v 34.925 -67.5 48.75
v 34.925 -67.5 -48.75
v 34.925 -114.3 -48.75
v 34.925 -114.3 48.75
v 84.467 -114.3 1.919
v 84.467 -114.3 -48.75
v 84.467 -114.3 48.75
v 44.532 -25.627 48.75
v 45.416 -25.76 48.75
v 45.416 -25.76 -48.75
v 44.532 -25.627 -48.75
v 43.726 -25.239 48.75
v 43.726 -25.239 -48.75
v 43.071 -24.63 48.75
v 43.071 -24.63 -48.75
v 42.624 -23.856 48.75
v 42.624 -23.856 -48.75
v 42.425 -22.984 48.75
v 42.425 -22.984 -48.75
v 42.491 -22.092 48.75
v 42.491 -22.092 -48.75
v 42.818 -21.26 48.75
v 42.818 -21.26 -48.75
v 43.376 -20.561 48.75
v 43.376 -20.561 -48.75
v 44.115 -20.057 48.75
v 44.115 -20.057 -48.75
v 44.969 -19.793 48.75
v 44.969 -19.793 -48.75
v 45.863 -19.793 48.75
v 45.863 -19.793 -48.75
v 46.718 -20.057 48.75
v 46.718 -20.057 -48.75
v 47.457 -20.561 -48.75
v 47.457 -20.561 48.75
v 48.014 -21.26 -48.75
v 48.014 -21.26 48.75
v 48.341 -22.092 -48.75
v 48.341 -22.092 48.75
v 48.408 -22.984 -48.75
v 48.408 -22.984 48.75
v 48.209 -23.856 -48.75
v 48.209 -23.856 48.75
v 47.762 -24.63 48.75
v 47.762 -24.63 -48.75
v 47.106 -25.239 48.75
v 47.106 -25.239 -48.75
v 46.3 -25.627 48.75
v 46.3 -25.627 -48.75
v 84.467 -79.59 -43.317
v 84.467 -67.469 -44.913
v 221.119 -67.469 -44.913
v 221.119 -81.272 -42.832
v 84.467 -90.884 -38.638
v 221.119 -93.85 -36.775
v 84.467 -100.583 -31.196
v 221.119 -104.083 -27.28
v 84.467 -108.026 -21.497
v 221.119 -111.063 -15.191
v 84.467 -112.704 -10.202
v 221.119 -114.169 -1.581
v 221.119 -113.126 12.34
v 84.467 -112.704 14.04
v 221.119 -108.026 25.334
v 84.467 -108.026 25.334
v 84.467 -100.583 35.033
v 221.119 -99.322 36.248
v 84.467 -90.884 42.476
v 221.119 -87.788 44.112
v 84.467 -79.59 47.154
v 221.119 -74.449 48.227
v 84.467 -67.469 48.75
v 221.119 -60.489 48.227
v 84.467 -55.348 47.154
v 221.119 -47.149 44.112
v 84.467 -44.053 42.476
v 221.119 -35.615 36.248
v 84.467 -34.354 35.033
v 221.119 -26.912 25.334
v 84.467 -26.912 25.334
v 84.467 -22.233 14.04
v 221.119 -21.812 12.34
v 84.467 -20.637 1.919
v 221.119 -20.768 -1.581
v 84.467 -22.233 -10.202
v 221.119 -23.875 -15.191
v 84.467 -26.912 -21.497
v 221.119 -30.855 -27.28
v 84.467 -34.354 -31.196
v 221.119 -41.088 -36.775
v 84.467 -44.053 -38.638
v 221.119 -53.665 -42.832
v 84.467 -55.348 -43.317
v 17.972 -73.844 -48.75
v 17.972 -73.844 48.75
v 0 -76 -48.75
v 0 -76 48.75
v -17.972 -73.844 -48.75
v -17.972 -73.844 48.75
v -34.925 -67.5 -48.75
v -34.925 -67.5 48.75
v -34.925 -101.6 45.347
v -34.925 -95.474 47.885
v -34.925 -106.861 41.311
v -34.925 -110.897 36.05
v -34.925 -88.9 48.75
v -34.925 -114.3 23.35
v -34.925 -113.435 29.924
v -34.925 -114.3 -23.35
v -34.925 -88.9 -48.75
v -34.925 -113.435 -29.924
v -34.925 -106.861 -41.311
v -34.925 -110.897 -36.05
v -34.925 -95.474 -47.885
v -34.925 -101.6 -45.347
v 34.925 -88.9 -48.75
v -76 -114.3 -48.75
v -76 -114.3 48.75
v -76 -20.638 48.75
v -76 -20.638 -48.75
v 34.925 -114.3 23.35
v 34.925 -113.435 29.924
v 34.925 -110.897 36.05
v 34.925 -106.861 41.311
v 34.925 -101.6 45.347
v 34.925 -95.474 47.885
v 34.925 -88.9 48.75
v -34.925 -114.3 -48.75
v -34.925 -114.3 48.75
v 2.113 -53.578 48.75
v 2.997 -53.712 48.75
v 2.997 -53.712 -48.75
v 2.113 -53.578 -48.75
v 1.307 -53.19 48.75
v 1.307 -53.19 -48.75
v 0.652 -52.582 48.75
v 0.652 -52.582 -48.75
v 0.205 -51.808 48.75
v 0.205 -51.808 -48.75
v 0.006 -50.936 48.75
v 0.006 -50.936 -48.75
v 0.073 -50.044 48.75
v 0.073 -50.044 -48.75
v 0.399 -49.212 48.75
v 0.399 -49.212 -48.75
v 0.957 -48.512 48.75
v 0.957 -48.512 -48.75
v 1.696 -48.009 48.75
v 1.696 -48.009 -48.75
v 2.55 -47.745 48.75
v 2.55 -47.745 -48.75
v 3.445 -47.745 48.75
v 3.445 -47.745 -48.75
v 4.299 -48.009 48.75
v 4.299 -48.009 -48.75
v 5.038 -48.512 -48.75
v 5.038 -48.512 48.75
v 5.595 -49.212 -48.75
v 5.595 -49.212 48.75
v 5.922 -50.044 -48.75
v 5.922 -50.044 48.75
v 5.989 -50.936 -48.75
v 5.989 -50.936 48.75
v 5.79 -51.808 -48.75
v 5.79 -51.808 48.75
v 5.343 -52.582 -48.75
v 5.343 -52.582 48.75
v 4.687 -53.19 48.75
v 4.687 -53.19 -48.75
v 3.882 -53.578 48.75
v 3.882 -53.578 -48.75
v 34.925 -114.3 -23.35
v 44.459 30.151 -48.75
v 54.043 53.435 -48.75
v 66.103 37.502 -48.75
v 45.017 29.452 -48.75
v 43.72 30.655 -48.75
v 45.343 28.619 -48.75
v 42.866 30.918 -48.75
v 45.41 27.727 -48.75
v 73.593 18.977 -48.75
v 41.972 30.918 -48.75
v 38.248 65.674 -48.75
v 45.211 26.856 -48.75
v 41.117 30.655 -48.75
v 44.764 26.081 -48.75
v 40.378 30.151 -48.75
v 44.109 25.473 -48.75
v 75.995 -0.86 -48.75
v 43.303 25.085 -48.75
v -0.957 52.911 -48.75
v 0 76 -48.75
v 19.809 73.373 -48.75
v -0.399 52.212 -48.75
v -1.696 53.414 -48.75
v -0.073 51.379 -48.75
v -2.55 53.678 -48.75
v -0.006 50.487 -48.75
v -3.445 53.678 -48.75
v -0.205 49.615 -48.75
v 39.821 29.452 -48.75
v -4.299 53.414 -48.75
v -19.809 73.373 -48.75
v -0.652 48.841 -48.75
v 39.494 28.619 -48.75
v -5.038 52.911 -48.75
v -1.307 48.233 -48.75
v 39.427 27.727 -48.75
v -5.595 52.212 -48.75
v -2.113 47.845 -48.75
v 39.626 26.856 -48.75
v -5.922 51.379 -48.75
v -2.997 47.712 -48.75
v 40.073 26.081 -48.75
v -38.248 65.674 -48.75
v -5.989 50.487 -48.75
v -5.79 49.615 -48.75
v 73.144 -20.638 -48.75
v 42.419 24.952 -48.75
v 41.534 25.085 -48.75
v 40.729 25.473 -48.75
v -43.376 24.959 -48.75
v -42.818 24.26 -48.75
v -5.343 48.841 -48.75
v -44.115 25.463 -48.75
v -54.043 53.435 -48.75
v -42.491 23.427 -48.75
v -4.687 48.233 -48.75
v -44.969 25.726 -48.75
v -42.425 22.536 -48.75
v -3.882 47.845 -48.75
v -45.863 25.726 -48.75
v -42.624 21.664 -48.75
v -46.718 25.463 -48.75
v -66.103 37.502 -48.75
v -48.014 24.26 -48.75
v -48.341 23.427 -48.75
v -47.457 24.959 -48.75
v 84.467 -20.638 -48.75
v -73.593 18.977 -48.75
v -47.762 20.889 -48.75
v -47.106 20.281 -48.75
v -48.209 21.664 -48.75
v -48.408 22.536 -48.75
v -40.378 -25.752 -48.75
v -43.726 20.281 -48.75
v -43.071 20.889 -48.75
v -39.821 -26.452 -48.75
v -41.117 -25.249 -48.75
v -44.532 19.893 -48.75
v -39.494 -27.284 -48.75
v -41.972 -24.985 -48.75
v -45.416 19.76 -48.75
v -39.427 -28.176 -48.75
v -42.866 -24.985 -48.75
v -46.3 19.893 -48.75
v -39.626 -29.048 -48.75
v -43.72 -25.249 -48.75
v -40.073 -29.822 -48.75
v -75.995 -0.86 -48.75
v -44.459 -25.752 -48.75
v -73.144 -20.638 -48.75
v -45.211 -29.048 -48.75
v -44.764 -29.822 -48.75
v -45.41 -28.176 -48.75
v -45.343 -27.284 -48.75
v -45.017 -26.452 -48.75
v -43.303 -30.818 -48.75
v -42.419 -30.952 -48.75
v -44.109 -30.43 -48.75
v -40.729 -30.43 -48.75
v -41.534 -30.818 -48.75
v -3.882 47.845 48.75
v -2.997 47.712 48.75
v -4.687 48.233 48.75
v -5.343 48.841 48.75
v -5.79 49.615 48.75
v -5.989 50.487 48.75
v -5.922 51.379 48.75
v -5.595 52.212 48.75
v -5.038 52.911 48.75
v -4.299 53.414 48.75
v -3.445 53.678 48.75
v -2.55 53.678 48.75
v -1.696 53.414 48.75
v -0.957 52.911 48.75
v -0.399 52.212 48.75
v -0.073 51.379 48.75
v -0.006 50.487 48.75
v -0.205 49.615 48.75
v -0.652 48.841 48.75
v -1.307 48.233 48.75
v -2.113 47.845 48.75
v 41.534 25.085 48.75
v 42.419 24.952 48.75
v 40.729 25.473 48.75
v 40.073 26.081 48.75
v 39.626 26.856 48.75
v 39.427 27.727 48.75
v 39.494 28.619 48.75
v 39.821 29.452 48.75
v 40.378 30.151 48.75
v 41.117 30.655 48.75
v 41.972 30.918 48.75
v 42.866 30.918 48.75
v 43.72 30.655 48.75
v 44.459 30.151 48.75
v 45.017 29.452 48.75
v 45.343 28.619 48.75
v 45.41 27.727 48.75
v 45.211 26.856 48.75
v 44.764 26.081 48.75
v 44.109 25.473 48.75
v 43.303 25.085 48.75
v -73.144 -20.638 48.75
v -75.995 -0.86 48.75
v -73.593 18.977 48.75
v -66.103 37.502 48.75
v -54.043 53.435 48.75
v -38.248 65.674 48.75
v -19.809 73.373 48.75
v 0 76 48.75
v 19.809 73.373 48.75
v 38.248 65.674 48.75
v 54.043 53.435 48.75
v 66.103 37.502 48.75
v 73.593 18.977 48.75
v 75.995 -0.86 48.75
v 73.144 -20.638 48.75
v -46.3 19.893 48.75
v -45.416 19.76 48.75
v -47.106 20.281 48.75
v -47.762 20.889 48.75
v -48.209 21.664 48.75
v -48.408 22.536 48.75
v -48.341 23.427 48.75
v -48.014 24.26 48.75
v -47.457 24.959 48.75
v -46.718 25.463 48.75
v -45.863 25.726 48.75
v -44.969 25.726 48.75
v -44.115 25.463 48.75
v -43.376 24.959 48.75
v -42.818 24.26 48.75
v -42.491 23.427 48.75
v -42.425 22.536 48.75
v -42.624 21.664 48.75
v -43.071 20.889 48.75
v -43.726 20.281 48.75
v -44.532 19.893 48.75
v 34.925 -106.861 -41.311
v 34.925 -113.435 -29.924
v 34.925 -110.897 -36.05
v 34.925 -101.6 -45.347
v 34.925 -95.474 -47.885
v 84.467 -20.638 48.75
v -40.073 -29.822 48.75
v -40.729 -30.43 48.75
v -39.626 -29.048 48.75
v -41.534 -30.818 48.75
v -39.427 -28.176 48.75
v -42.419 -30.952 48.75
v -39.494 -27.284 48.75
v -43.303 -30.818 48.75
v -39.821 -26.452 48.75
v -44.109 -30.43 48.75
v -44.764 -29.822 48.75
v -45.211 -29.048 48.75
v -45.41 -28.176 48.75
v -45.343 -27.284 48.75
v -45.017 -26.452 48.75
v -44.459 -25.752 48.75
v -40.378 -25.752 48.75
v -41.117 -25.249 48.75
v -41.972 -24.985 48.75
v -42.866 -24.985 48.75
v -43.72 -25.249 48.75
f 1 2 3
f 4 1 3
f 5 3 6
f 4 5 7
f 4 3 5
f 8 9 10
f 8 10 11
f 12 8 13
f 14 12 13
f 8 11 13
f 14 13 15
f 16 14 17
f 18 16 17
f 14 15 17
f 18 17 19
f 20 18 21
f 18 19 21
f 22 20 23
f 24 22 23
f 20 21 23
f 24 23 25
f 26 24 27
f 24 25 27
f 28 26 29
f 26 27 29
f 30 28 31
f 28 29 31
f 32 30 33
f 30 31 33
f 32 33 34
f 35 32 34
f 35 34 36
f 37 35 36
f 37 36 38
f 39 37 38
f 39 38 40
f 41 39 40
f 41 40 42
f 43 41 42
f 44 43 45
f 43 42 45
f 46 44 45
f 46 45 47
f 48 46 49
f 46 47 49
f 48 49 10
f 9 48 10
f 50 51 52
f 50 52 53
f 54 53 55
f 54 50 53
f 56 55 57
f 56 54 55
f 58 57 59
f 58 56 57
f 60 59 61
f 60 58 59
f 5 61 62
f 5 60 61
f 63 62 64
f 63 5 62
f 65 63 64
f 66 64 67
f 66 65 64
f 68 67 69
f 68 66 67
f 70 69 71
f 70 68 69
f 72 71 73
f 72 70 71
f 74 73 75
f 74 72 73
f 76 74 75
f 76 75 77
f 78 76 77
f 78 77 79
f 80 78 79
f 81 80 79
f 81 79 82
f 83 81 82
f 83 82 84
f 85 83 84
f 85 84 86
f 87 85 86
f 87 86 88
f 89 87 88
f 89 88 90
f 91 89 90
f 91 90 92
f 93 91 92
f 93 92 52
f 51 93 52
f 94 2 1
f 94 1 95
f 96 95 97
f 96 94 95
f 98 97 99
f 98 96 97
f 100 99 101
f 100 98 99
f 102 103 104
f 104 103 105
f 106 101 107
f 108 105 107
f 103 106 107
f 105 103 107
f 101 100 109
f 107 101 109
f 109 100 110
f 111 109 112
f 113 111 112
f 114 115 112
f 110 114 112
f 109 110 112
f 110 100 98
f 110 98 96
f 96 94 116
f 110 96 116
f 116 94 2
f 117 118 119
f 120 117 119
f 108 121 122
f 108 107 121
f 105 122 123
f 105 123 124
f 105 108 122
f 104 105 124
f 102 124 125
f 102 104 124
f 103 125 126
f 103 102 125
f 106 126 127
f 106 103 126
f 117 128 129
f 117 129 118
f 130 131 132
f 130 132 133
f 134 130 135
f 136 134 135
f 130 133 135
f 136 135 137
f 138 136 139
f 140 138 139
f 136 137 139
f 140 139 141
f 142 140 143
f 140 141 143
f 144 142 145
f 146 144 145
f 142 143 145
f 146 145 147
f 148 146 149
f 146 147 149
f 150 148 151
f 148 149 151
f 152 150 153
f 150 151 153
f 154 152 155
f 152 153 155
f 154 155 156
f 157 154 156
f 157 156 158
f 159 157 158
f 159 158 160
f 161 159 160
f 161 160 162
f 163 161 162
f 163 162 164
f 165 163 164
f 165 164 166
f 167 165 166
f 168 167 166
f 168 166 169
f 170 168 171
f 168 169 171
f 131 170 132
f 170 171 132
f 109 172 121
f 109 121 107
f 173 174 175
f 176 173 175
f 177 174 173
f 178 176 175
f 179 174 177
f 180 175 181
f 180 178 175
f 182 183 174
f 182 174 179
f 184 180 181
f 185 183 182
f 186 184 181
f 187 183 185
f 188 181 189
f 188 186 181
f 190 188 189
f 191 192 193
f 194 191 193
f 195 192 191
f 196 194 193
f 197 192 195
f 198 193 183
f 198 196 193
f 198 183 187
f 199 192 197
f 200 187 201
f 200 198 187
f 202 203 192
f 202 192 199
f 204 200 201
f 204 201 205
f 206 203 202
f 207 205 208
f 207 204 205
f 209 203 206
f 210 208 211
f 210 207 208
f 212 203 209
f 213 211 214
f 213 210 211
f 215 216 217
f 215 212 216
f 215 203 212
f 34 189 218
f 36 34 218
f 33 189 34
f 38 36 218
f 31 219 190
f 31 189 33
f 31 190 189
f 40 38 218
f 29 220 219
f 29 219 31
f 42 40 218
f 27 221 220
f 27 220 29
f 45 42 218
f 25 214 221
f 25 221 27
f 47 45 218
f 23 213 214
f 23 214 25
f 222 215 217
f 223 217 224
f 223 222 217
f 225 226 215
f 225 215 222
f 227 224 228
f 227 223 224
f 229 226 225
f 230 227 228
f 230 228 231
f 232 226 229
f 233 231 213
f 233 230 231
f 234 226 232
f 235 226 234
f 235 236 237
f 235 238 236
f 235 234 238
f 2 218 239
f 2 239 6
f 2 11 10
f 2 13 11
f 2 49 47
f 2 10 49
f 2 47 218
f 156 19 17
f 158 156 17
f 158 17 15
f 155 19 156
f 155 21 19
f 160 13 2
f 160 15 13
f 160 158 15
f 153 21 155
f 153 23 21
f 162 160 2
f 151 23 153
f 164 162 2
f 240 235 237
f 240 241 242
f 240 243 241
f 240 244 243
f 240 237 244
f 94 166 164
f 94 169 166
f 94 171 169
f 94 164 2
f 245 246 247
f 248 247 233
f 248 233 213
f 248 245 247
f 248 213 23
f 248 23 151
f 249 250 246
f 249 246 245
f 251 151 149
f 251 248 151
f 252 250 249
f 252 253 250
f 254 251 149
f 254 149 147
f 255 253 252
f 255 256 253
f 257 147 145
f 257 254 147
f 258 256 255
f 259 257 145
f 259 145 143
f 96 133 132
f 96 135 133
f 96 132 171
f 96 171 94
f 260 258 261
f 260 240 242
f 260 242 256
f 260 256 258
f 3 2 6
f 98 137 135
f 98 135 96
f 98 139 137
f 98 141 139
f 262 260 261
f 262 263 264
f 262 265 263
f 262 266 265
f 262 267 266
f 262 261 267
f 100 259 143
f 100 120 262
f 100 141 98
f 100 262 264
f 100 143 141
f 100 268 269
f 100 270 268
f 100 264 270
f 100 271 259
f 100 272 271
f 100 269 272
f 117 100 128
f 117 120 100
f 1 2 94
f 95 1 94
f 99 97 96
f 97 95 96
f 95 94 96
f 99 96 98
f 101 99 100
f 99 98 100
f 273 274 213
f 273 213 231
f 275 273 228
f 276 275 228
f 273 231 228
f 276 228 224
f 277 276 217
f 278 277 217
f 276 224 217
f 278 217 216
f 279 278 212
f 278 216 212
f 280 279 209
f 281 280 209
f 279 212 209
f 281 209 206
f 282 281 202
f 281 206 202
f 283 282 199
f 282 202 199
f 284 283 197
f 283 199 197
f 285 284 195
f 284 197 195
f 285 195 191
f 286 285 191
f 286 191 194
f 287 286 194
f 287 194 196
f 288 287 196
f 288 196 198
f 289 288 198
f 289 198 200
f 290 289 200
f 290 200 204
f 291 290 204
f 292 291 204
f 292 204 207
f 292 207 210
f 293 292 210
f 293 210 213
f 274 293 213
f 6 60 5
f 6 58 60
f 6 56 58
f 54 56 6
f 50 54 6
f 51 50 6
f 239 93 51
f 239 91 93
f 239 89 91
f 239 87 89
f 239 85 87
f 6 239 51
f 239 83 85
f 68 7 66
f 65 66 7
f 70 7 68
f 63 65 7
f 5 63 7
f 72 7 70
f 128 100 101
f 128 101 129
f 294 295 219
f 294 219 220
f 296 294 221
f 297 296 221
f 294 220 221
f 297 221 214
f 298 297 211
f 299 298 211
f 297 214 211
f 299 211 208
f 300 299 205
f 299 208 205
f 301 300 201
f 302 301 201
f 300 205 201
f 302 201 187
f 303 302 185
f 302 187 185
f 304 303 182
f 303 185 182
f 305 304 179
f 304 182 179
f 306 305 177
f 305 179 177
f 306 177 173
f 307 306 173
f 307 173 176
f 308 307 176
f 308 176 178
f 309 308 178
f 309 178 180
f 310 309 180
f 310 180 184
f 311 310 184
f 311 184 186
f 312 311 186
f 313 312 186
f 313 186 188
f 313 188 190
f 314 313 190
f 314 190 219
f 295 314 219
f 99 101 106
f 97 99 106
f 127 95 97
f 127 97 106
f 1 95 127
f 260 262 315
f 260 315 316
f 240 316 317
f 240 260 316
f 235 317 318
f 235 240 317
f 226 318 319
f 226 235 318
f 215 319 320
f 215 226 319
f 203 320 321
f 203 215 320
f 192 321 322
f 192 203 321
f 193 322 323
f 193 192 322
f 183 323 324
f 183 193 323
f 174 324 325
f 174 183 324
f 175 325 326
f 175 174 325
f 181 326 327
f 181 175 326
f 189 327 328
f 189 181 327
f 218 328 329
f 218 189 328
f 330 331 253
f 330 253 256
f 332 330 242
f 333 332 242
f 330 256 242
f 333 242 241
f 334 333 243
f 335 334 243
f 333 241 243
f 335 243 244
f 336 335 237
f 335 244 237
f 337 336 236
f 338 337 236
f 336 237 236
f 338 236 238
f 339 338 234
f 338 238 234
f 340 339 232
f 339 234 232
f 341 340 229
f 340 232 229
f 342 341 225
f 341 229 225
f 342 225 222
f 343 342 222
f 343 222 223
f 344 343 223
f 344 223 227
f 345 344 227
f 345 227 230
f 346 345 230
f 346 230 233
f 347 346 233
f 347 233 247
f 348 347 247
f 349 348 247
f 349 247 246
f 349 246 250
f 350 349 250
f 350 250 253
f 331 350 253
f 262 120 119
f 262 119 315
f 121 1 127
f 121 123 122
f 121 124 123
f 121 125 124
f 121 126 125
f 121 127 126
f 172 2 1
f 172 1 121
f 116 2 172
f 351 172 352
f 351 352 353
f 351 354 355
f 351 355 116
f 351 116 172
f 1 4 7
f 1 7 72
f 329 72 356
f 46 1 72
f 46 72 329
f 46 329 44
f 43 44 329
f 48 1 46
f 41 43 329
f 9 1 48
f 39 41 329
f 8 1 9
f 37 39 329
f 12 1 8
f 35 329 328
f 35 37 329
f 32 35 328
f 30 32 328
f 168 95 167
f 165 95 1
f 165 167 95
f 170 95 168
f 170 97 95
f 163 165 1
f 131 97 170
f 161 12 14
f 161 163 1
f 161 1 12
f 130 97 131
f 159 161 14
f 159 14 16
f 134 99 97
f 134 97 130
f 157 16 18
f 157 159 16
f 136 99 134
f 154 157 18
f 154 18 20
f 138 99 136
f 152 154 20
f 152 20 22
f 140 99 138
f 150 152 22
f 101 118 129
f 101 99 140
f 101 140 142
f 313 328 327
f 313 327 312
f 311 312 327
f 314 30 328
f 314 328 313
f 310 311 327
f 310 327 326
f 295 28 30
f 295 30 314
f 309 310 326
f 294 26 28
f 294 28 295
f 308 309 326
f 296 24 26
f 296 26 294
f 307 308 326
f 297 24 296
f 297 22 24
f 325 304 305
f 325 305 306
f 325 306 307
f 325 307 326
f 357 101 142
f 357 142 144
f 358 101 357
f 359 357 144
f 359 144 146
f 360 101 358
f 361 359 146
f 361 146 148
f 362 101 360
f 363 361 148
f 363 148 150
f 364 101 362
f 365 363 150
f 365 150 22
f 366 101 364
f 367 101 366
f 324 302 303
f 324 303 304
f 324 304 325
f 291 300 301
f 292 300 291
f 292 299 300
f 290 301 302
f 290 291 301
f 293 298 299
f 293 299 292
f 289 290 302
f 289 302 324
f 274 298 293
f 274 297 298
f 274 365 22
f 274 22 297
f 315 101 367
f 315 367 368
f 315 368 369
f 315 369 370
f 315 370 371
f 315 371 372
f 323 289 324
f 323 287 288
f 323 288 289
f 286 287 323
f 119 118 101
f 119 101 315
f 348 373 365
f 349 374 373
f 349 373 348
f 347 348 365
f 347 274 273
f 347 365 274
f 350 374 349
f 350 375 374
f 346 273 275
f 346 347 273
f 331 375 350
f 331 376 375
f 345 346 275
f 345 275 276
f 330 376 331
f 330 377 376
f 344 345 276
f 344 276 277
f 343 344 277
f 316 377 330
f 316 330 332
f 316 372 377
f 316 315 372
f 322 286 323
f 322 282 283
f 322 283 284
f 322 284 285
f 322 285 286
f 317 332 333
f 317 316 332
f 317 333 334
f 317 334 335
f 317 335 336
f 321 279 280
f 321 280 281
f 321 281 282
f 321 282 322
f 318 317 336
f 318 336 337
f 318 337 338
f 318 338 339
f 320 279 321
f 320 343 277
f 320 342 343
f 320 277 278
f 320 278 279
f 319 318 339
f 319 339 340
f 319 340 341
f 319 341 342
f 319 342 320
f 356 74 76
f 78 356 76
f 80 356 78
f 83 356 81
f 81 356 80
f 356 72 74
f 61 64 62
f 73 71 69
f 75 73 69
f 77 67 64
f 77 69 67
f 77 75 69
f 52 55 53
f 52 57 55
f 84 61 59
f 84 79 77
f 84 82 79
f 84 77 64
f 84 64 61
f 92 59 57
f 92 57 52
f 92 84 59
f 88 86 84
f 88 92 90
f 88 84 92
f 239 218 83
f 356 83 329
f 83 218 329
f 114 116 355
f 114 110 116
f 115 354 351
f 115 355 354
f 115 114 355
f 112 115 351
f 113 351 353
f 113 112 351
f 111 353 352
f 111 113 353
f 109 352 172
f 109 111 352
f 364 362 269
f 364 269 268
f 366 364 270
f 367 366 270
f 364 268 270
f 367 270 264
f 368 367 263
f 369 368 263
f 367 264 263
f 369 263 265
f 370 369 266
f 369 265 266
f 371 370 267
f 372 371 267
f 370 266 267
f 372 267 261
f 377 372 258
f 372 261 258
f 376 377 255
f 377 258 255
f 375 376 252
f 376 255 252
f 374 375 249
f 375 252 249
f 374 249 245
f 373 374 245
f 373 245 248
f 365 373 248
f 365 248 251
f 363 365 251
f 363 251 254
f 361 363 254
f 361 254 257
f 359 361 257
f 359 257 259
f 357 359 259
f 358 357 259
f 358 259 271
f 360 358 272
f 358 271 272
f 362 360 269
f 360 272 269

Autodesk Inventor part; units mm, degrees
ref_plane "YZ Plane" through (0, 0, 0) normal (1, 0, 0) x (0, 1, 0)
ref_plane "XZ Plane" through (0, 0, 0) normal (0, 1, 0) x (-1, 0, 0)
ref_plane "XY Plane" through (0, 0, 0) normal (0, 0, 1) x (1, 0, 0)
sketch "Sketch3" plane through (0, 0, 0) normal (0, 0, 1) x (1, 0, 0)
  circle A0 centre (0, 0) radius 76
  circle A1 centre (0, 0) radius 12.7
  circle A2 centre (0, 0) radius 50.8
  circle A3 centre (-45.4162, 22.7599) radius 3
  circle A4 centre (0, 12.7) radius 3
  line L0 (-76, 0) -> (76, 0)
  line L1 (76, 0) -> (76, -114.3)
  line L2 (76, -114.3) -> (-76, -114.3)
  line L3 (-76, -114.3) -> (-76, 0)
  circle A5 centre (-42.4187, -27.9516) radius 3
  circle A6 centre (2.9974, -50.7115) radius 3
  circle A7 centre (45.4162, -22.7599) radius 3
  circle A8 centre (42.4187, 27.9516) radius 3
  circle A9 centre (-2.9974, 50.7115) radius 3
  circle A10 centre (-12.7, 0) radius 3
  circle A11 centre (0, -12.7) radius 3
  circle A12 centre (12.7, 0) radius 3
  line L4 (-76, -20.6375) -> (-34.925, -20.6375)
  line L5 (-34.925, -20.6375) -> (-34.925, -114.3)
  line L6 (-34.925, -114.3) -> (-76, -114.3)
  line L7 (-76, -114.3) -> (-76, -20.6375)
  line L8 (0, 0) -> (0, -114.3) construction
  line L9 (76, -20.6375) -> (34.925, -20.6375)
  line L10 (34.925, -20.6375) -> (34.925, -114.3)
  line L11 (-2.9974, 50.7115) -> (-2.9974, 0) construction
  point P0 (34.925, -67.5)
  point P1 (73.1443, -20.6375)
  point P2 (-34.925, -67.5)
  dimension "d5" = 152
  dimension "d20" = 101.6
  dimension "d21" = 25.4
  dimension "d8" = 6
  dimension "d9" = 6
  dimension "d12" = 360
  dimension "d16" = 360
  dimension "d22" = 114.3
extrude "Extrusion3" add sketch "Sketch3" along normal mid plane 97.5 contours L0 A2 A8 A9 A3 A0 | A0 L9 A7 A2 L0 | L0 A2 L4 A0 | A0 L10 A2 A7 L9 | L0 A12 A1 A4 A10 A2 A3 A9 A8 | A2 A7 L9 L10 A6 L5 L4 L0 A10 A1 A11 A12 | L4 A2 A5 L5 A0 | A0 L5 A2 A6 L10 | L9 A2 A7 | A7 A2 L9 | A8 A2 | A2 A8 | A2 L9 A7 | A12 A1 L0 | L0 A1 A12 | L4 L5 A2 A5 | A3 A2 | A2 A3 | A10 A1 L0 | L0 A1 A10 | L10 L9 A7 A2 | A2 A7 L9 | L0 A12 A1 | A1 A12 L0 | A12 L0 A10 A1 A4 | A1 A11 A10 L0 A12 | A5 A2 | A2 A5 | L0 A10 A1 | A1 A10 L0 | A6 A2 | A2 A6 | A9 A2 | A2 A9 | A4 A1 | A1 A4 | A11 A1 | A1 A11
extrude "Extrusion4" add sketch "Sketch3" along normal mid plane 97.5 contours L9 L1 L2 L10 A0 | L4 A2 A5 L5 A0 | A0 L5 L2 L3 L4 | L4 L5 A2 A5 | A5 A2 | A2 A5
extrude "Extrusion5" add sketch "Sketch3" along normal mid plane 97.5 separate body contours L10 L2 L5 A0
fillet "Fillet1" radius 25.4 2 edges at (0, -114.3, 48.75) (0, -114.3, -48.75)
sketch "Sketch4" plane through (76, -114.3, 48.75) normal (1, 0, 0) x (0, 0, -1)
  line L0 (0, 0) -> (0, 93.6625) projected
  line L1 (97.5, 0) -> (0, 0) projected
  line L2 (97.5, 93.6625) -> (97.5, 0) projected
  line L3 (97.5, 0) -> (0, 0) projected
  line L4 (97.5, 0) -> (97.5, 93.6625) projected
  line L5 (0, 0) -> (97.5, 0)
  line L6 (97.5, 0) -> (97.5, 93.6625)
  line L7 (97.5, 93.6625) -> (0, 93.6625)
  line L8 (0, 93.6625) -> (0, 0)
  point P0 (48.75, 114.3)
extrude "Extrusion6" add sketch "Sketch4" along normal blind 8.4667 bodies 1
sketch "Sketch5" plane through (84.4667, -114.3, 48.75) normal (1, 0, 0) x (0, 0, -1)
  line L0 (0, 93.6625) -> (0, 0) projected
  line L1 (0, 0) -> (97.5, 0) projected
  line L2 (97.5, 0) -> (97.5, 93.6625) projected
  line L3 (97.5, 93.6625) -> (0, 93.6625) projected
  line L4 (0, 93.6625) -> (0, 0) projected
  circle A0 centre (46.8313, 46.8313) radius 46.8313
  line L5 (97.5, 93.6625) -> (0, 93.6625) projected
  line L6 (0, 0) -> (97.5, 0) projected
  point P0 (48.75, 114.3)
extrude "Extrusion7" add sketch "Sketch5" along normal blind 136.652 contours A0 bodies 1
sketch "Sketch6" plane through (0, 0, 48.75) normal (0, 0, 1) x (1, 0, 0)
  circle A0 centre (-45.4162, 22.7599) radius 3 projected
  circle A1 centre (-2.9974, 50.7115) radius 3 projected
  circle A2 centre (42.4187, 27.9516) radius 3 projected
  circle A3 centre (45.4162, -22.7599) radius 3 projected
  circle A4 centre (2.9974, -50.7115) radius 3 projected
  circle A5 centre (-42.4187, -27.9516) radius 3 projected
  point P0 (0, 0)
hole "Hole1" at (-42.4187, -27.9516, 48.75) at (-45.4162, 22.7599, 48.75) at (-2.9974, 50.7115, 48.75) at (42.4187, 27.9516, 48.75) at (45.4162, -22.7599, 48.75) at (2.9974, -50.7115, 48.75) direction (0, 0, -1) diameter 6 end through all bodies 1
properties part number "RotaryPlatform"
